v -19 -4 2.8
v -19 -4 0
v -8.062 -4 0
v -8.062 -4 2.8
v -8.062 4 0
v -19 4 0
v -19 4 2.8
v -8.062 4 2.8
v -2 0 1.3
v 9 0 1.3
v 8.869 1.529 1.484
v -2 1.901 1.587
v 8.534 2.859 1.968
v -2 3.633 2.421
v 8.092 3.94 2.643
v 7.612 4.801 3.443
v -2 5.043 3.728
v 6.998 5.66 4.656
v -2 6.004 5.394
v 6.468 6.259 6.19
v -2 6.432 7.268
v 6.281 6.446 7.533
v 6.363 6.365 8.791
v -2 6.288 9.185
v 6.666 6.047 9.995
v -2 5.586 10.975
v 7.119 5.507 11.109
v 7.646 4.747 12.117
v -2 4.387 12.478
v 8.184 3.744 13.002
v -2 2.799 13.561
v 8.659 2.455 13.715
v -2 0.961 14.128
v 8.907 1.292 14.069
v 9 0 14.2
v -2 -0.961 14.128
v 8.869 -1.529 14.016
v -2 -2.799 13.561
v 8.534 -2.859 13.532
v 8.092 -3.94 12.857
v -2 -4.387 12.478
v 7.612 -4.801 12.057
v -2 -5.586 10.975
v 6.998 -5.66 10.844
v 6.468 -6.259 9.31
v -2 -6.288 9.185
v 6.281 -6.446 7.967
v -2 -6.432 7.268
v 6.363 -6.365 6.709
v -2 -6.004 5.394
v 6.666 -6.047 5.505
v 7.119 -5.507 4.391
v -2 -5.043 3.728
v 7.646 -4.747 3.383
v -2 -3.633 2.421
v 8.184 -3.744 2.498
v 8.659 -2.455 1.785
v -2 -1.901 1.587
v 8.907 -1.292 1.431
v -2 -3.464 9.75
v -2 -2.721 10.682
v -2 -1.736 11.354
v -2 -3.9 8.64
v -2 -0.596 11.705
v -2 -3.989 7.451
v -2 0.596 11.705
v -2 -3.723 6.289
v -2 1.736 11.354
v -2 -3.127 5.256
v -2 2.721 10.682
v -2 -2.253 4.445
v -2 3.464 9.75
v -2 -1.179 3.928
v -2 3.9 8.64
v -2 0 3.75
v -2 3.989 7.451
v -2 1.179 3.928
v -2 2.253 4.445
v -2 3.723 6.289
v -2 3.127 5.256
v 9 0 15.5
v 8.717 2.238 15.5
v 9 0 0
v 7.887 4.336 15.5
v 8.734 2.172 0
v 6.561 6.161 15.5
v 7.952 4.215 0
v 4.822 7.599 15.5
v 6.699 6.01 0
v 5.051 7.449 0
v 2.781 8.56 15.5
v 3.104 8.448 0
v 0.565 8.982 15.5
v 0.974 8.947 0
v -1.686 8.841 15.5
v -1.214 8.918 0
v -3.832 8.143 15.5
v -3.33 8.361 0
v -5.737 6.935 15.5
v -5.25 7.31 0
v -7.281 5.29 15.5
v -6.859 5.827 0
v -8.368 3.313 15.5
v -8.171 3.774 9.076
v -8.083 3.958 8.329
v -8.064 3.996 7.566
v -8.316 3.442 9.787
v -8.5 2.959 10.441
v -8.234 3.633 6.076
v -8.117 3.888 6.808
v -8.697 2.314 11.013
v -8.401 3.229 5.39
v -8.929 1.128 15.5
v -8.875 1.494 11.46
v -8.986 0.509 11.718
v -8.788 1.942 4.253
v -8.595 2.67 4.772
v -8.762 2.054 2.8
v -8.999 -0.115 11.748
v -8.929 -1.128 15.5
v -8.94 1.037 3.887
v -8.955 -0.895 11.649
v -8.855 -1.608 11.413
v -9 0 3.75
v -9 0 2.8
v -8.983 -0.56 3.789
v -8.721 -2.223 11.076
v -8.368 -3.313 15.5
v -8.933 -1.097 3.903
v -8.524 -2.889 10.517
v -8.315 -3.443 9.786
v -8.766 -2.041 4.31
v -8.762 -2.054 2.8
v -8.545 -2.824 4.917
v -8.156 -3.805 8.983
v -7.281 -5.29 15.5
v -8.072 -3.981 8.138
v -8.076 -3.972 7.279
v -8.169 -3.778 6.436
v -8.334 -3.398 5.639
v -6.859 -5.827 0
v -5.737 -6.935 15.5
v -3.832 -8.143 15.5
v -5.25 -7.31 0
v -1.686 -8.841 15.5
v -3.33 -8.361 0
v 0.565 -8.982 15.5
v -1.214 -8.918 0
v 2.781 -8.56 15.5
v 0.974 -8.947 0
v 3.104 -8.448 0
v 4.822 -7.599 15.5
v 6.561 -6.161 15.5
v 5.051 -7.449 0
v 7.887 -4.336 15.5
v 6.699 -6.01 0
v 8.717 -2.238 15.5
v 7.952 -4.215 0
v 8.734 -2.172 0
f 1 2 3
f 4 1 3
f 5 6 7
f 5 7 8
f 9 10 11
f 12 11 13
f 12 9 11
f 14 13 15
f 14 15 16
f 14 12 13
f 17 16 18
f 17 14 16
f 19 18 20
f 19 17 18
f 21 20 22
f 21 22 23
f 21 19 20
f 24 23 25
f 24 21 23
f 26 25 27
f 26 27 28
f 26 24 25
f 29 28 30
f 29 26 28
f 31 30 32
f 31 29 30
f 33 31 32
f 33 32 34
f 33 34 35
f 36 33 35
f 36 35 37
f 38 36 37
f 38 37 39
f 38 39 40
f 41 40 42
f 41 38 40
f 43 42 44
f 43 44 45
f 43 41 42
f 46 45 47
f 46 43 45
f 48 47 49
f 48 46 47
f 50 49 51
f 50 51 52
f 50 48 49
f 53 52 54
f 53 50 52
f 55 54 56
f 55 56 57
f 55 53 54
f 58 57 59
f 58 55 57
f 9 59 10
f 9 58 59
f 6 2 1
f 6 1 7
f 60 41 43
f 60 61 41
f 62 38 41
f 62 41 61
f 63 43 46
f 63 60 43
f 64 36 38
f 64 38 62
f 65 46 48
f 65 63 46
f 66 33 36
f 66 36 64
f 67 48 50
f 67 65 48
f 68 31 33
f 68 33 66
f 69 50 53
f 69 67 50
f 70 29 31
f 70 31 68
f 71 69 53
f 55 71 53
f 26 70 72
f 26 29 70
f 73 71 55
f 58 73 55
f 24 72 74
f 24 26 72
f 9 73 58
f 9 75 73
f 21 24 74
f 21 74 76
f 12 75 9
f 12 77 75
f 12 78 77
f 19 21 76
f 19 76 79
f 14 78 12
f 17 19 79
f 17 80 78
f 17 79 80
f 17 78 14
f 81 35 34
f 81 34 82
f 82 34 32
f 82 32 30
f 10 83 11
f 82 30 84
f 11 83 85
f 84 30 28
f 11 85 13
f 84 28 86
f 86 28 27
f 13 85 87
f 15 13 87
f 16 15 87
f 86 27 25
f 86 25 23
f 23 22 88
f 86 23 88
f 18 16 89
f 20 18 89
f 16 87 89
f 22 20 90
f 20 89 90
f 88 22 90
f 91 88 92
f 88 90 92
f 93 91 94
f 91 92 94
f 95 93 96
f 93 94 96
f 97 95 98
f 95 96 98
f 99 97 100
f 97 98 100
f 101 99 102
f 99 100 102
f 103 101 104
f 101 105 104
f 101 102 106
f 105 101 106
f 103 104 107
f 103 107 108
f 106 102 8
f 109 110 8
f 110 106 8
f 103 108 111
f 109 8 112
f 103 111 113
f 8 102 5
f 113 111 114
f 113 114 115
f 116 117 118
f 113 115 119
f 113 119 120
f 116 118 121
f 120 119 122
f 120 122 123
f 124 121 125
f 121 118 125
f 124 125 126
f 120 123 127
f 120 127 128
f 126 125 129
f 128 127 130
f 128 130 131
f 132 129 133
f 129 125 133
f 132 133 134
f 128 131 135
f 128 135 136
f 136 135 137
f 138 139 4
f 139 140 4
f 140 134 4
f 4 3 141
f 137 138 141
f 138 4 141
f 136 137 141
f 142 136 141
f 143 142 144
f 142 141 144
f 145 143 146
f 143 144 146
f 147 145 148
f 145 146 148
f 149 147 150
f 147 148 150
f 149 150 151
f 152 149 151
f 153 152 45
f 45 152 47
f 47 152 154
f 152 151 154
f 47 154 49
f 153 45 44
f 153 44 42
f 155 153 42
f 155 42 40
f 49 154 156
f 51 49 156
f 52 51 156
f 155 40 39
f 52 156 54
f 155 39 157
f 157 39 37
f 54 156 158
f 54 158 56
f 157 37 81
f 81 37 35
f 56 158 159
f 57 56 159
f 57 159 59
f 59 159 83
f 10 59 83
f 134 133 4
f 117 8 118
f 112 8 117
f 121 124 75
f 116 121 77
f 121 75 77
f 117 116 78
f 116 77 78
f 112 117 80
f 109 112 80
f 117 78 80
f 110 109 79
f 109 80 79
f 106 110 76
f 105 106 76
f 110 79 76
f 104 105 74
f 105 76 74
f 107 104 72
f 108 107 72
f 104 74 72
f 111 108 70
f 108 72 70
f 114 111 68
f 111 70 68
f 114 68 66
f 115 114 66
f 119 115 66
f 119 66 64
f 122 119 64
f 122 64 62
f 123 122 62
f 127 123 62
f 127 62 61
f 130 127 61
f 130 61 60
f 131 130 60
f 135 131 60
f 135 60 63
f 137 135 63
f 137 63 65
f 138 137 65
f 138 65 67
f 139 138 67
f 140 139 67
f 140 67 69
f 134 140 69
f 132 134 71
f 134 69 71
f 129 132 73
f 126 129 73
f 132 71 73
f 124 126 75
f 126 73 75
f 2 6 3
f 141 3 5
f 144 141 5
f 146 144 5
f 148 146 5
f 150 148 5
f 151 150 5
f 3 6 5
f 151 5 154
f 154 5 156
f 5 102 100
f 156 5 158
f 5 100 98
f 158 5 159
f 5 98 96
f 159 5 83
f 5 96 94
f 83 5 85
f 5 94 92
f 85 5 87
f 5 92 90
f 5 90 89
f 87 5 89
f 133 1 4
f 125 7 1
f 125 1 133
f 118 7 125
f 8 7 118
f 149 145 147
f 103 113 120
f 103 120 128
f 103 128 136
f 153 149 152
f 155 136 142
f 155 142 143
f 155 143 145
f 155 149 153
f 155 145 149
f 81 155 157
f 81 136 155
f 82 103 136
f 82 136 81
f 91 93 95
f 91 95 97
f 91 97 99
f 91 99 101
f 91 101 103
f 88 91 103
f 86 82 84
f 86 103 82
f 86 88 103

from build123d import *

# Parameters (mm, degrees)
SKETCH_1_R               = 9
EXTRUDE_1_DEPTH          = 15.5
SKETCH_2_W               = 10.937742252
SKETCH_2_H               = 8
EXTRUDE_2_DEPTH          = 2.8
SKETCH_3_R               = 6.45
CUT_EXTRUDE_1_DEPTH      = 10
CUT_EXTRUDE_1_DEPTH_BACK = 2
SKETCH_4_R               = 4
CUT_EXTRUDE_2_DEPTH      = 18


with BuildPart() as part:
    # Эскиз1 → Бобышка-Вытянуть1 (new body)
    with BuildSketch(Plane.XY):
        Circle(SKETCH_1_R)
    extrude(amount=EXTRUDE_1_DEPTH)

    # Эскиз2 → Бобышка-Вытянуть2 (add)
    with BuildSketch(Plane.XY):
        with Locations((-13.531128874, 0)):
            Rectangle(SKETCH_2_W, SKETCH_2_H)
    extrude(amount=EXTRUDE_2_DEPTH)

    # Эскиз3 → Вырез-Вытянуть1 (cut, two sides)
    with BuildSketch(Plane(origin=(0, 0, 0), x_dir=(0, 0, -1), z_dir=(1, 0, 0))) as cut_extrude_1_sk:
        with Locations((-7.75, 0)):
            Circle(SKETCH_3_R)
    extrude(amount=CUT_EXTRUDE_1_DEPTH, mode=Mode.SUBTRACT)
    extrude(cut_extrude_1_sk.sketch, amount=-CUT_EXTRUDE_1_DEPTH_BACK, mode=Mode.SUBTRACT)

    # Эскиз4 → Вырез-Вытянуть2 (cut, through all)
    with BuildSketch(Plane(origin=(-2, 0, 0), x_dir=(0, 0, -1), z_dir=(1, 0, 0))):
        with Locations((-7.75, 0)):
            Circle(SKETCH_4_R)
    extrude(amount=-CUT_EXTRUDE_2_DEPTH, mode=Mode.SUBTRACT)


solid = part.part
